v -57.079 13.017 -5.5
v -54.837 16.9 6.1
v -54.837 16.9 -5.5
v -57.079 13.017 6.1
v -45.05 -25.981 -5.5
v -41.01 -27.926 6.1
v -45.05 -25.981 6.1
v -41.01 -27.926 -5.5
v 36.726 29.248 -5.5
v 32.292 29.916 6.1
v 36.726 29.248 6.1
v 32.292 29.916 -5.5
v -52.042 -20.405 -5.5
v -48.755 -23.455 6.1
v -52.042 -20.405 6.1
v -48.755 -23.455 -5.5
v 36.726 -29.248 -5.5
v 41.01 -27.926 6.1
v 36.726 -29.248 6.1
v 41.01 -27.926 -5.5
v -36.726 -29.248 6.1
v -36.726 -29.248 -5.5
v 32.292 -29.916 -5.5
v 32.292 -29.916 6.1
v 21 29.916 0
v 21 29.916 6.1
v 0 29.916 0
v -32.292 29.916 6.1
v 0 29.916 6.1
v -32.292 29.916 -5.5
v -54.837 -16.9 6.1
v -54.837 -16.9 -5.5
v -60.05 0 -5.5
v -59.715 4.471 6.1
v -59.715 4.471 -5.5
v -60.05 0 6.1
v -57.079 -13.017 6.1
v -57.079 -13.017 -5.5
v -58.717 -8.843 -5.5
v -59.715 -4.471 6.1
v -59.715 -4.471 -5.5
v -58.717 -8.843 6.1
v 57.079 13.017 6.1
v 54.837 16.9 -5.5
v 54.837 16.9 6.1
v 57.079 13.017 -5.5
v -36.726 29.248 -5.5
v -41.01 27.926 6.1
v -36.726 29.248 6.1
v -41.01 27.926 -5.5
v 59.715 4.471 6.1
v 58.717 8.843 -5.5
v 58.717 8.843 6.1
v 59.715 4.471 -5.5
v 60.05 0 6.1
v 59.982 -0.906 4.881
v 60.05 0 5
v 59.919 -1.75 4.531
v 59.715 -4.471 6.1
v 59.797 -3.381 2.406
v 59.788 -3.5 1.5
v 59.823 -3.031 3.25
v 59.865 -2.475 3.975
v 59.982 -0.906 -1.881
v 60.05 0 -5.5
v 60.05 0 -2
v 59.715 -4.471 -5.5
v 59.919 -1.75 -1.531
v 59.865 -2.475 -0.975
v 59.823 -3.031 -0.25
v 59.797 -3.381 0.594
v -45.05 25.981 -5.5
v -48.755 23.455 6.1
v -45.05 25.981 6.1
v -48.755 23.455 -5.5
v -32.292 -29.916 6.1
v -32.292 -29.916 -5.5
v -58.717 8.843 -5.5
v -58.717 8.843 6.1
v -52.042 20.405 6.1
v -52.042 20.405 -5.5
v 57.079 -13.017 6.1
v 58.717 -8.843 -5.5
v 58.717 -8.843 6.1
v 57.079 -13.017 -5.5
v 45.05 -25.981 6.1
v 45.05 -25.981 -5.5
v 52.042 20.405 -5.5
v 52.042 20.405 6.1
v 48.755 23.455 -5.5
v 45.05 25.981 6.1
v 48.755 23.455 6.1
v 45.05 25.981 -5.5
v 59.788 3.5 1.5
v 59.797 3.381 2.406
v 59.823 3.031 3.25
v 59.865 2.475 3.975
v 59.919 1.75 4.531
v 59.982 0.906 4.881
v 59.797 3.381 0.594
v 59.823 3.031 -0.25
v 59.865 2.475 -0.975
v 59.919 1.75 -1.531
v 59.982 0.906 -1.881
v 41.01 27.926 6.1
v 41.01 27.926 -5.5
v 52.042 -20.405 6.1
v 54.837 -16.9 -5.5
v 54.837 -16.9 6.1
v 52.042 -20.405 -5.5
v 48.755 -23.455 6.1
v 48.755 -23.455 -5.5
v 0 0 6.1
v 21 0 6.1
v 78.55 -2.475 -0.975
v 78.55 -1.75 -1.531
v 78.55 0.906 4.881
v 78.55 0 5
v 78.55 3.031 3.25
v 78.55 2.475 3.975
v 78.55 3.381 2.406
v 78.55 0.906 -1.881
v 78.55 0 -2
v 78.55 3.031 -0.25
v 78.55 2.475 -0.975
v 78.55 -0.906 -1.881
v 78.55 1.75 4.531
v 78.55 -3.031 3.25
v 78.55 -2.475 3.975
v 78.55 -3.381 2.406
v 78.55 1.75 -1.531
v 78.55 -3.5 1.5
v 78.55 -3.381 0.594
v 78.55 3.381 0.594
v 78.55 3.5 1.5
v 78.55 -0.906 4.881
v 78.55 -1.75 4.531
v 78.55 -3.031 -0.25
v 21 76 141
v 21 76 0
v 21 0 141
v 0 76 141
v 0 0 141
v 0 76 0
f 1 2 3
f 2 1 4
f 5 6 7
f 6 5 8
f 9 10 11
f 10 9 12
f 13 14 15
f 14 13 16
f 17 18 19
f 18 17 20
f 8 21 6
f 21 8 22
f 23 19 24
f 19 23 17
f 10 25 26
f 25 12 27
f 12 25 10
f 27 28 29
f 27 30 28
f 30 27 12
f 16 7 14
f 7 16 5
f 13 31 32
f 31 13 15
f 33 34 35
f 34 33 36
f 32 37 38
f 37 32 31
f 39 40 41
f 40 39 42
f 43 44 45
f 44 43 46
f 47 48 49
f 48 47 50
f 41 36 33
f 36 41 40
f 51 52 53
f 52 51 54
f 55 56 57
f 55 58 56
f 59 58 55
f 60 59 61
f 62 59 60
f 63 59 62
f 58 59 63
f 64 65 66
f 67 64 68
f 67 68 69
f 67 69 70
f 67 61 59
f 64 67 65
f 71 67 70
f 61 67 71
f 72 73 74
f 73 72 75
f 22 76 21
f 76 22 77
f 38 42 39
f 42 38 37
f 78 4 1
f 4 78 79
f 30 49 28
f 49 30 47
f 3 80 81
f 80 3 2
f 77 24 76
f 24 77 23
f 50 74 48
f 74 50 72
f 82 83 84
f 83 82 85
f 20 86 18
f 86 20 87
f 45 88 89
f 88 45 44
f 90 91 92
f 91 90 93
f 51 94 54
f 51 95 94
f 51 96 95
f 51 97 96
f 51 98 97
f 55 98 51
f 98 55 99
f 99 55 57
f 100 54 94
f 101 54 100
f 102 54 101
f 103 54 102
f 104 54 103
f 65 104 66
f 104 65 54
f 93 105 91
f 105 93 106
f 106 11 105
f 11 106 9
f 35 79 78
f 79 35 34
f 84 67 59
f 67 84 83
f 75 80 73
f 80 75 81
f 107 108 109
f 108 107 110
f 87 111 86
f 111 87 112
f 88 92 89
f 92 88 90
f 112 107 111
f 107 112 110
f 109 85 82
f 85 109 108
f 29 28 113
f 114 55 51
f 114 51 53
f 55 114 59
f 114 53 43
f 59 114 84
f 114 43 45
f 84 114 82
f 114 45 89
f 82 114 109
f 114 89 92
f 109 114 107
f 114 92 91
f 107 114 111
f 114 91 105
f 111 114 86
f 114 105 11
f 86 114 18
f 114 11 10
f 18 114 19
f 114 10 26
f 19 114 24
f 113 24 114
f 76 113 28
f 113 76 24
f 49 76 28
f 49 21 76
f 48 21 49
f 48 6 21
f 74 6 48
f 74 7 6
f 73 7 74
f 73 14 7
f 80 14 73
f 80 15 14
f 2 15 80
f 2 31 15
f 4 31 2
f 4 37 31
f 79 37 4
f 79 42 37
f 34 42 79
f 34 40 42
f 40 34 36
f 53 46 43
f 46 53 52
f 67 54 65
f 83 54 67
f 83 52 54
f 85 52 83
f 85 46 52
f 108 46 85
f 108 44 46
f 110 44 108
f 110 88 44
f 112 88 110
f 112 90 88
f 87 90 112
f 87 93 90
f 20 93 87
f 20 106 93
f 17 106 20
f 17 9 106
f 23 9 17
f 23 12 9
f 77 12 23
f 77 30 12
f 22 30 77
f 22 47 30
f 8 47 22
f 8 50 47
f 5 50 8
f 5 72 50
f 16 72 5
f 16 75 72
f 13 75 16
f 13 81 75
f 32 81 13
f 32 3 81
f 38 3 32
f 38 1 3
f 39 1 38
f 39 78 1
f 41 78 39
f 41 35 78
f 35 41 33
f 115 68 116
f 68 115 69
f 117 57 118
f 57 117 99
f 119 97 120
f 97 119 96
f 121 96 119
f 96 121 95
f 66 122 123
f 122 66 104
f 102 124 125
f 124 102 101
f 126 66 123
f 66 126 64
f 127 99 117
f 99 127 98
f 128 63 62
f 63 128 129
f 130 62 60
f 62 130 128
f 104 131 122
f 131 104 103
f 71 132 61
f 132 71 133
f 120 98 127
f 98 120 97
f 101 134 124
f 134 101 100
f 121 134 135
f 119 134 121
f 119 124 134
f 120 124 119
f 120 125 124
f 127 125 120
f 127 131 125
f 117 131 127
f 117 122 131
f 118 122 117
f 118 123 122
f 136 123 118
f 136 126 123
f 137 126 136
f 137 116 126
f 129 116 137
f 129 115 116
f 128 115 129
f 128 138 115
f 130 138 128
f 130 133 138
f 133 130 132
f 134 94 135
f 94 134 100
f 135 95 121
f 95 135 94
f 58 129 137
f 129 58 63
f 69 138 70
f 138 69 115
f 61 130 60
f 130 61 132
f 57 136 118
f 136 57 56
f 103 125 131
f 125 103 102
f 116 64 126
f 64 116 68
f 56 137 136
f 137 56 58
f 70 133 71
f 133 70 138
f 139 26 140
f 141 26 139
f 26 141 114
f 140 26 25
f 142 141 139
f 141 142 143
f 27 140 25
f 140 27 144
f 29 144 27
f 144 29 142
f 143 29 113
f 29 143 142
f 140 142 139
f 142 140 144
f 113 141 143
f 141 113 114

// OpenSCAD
// file: dt900.scad
module dt900()
{
  dt900_end_to_end = 120.1;
  dt900_width = 60;
  dt900_thickness = 11;
  dt900_charge_diam = 7;
  dt900_charge_offset = 1.5;
  dt900_charge_length = 18.5;

  extra_front = 0.6;

  // main body
  hull()
  {
    for(i=[-1,+1])
    translate([i*(dt900_end_to_end-dt900_width)/2, 0, extra_front/2])
    cylinder(r=dt900_width/2, h=dt900_thickness+extra_front, $fn=42, center=true);
  }

  // charger (on right)
  translate([0, 0, dt900_charge_offset])
  rotate([0, 90, 0])
  cylinder(r=dt900_charge_diam/2, h=dt900_charge_length+dt900_end_to_end/2, $fn=24);
}

dt900();
// main file
// Wireless Charging Stand

use <dt900.scad>;

module phone(){
	cube(size=[21, 76, 141]);
}

dt900();
phone();
